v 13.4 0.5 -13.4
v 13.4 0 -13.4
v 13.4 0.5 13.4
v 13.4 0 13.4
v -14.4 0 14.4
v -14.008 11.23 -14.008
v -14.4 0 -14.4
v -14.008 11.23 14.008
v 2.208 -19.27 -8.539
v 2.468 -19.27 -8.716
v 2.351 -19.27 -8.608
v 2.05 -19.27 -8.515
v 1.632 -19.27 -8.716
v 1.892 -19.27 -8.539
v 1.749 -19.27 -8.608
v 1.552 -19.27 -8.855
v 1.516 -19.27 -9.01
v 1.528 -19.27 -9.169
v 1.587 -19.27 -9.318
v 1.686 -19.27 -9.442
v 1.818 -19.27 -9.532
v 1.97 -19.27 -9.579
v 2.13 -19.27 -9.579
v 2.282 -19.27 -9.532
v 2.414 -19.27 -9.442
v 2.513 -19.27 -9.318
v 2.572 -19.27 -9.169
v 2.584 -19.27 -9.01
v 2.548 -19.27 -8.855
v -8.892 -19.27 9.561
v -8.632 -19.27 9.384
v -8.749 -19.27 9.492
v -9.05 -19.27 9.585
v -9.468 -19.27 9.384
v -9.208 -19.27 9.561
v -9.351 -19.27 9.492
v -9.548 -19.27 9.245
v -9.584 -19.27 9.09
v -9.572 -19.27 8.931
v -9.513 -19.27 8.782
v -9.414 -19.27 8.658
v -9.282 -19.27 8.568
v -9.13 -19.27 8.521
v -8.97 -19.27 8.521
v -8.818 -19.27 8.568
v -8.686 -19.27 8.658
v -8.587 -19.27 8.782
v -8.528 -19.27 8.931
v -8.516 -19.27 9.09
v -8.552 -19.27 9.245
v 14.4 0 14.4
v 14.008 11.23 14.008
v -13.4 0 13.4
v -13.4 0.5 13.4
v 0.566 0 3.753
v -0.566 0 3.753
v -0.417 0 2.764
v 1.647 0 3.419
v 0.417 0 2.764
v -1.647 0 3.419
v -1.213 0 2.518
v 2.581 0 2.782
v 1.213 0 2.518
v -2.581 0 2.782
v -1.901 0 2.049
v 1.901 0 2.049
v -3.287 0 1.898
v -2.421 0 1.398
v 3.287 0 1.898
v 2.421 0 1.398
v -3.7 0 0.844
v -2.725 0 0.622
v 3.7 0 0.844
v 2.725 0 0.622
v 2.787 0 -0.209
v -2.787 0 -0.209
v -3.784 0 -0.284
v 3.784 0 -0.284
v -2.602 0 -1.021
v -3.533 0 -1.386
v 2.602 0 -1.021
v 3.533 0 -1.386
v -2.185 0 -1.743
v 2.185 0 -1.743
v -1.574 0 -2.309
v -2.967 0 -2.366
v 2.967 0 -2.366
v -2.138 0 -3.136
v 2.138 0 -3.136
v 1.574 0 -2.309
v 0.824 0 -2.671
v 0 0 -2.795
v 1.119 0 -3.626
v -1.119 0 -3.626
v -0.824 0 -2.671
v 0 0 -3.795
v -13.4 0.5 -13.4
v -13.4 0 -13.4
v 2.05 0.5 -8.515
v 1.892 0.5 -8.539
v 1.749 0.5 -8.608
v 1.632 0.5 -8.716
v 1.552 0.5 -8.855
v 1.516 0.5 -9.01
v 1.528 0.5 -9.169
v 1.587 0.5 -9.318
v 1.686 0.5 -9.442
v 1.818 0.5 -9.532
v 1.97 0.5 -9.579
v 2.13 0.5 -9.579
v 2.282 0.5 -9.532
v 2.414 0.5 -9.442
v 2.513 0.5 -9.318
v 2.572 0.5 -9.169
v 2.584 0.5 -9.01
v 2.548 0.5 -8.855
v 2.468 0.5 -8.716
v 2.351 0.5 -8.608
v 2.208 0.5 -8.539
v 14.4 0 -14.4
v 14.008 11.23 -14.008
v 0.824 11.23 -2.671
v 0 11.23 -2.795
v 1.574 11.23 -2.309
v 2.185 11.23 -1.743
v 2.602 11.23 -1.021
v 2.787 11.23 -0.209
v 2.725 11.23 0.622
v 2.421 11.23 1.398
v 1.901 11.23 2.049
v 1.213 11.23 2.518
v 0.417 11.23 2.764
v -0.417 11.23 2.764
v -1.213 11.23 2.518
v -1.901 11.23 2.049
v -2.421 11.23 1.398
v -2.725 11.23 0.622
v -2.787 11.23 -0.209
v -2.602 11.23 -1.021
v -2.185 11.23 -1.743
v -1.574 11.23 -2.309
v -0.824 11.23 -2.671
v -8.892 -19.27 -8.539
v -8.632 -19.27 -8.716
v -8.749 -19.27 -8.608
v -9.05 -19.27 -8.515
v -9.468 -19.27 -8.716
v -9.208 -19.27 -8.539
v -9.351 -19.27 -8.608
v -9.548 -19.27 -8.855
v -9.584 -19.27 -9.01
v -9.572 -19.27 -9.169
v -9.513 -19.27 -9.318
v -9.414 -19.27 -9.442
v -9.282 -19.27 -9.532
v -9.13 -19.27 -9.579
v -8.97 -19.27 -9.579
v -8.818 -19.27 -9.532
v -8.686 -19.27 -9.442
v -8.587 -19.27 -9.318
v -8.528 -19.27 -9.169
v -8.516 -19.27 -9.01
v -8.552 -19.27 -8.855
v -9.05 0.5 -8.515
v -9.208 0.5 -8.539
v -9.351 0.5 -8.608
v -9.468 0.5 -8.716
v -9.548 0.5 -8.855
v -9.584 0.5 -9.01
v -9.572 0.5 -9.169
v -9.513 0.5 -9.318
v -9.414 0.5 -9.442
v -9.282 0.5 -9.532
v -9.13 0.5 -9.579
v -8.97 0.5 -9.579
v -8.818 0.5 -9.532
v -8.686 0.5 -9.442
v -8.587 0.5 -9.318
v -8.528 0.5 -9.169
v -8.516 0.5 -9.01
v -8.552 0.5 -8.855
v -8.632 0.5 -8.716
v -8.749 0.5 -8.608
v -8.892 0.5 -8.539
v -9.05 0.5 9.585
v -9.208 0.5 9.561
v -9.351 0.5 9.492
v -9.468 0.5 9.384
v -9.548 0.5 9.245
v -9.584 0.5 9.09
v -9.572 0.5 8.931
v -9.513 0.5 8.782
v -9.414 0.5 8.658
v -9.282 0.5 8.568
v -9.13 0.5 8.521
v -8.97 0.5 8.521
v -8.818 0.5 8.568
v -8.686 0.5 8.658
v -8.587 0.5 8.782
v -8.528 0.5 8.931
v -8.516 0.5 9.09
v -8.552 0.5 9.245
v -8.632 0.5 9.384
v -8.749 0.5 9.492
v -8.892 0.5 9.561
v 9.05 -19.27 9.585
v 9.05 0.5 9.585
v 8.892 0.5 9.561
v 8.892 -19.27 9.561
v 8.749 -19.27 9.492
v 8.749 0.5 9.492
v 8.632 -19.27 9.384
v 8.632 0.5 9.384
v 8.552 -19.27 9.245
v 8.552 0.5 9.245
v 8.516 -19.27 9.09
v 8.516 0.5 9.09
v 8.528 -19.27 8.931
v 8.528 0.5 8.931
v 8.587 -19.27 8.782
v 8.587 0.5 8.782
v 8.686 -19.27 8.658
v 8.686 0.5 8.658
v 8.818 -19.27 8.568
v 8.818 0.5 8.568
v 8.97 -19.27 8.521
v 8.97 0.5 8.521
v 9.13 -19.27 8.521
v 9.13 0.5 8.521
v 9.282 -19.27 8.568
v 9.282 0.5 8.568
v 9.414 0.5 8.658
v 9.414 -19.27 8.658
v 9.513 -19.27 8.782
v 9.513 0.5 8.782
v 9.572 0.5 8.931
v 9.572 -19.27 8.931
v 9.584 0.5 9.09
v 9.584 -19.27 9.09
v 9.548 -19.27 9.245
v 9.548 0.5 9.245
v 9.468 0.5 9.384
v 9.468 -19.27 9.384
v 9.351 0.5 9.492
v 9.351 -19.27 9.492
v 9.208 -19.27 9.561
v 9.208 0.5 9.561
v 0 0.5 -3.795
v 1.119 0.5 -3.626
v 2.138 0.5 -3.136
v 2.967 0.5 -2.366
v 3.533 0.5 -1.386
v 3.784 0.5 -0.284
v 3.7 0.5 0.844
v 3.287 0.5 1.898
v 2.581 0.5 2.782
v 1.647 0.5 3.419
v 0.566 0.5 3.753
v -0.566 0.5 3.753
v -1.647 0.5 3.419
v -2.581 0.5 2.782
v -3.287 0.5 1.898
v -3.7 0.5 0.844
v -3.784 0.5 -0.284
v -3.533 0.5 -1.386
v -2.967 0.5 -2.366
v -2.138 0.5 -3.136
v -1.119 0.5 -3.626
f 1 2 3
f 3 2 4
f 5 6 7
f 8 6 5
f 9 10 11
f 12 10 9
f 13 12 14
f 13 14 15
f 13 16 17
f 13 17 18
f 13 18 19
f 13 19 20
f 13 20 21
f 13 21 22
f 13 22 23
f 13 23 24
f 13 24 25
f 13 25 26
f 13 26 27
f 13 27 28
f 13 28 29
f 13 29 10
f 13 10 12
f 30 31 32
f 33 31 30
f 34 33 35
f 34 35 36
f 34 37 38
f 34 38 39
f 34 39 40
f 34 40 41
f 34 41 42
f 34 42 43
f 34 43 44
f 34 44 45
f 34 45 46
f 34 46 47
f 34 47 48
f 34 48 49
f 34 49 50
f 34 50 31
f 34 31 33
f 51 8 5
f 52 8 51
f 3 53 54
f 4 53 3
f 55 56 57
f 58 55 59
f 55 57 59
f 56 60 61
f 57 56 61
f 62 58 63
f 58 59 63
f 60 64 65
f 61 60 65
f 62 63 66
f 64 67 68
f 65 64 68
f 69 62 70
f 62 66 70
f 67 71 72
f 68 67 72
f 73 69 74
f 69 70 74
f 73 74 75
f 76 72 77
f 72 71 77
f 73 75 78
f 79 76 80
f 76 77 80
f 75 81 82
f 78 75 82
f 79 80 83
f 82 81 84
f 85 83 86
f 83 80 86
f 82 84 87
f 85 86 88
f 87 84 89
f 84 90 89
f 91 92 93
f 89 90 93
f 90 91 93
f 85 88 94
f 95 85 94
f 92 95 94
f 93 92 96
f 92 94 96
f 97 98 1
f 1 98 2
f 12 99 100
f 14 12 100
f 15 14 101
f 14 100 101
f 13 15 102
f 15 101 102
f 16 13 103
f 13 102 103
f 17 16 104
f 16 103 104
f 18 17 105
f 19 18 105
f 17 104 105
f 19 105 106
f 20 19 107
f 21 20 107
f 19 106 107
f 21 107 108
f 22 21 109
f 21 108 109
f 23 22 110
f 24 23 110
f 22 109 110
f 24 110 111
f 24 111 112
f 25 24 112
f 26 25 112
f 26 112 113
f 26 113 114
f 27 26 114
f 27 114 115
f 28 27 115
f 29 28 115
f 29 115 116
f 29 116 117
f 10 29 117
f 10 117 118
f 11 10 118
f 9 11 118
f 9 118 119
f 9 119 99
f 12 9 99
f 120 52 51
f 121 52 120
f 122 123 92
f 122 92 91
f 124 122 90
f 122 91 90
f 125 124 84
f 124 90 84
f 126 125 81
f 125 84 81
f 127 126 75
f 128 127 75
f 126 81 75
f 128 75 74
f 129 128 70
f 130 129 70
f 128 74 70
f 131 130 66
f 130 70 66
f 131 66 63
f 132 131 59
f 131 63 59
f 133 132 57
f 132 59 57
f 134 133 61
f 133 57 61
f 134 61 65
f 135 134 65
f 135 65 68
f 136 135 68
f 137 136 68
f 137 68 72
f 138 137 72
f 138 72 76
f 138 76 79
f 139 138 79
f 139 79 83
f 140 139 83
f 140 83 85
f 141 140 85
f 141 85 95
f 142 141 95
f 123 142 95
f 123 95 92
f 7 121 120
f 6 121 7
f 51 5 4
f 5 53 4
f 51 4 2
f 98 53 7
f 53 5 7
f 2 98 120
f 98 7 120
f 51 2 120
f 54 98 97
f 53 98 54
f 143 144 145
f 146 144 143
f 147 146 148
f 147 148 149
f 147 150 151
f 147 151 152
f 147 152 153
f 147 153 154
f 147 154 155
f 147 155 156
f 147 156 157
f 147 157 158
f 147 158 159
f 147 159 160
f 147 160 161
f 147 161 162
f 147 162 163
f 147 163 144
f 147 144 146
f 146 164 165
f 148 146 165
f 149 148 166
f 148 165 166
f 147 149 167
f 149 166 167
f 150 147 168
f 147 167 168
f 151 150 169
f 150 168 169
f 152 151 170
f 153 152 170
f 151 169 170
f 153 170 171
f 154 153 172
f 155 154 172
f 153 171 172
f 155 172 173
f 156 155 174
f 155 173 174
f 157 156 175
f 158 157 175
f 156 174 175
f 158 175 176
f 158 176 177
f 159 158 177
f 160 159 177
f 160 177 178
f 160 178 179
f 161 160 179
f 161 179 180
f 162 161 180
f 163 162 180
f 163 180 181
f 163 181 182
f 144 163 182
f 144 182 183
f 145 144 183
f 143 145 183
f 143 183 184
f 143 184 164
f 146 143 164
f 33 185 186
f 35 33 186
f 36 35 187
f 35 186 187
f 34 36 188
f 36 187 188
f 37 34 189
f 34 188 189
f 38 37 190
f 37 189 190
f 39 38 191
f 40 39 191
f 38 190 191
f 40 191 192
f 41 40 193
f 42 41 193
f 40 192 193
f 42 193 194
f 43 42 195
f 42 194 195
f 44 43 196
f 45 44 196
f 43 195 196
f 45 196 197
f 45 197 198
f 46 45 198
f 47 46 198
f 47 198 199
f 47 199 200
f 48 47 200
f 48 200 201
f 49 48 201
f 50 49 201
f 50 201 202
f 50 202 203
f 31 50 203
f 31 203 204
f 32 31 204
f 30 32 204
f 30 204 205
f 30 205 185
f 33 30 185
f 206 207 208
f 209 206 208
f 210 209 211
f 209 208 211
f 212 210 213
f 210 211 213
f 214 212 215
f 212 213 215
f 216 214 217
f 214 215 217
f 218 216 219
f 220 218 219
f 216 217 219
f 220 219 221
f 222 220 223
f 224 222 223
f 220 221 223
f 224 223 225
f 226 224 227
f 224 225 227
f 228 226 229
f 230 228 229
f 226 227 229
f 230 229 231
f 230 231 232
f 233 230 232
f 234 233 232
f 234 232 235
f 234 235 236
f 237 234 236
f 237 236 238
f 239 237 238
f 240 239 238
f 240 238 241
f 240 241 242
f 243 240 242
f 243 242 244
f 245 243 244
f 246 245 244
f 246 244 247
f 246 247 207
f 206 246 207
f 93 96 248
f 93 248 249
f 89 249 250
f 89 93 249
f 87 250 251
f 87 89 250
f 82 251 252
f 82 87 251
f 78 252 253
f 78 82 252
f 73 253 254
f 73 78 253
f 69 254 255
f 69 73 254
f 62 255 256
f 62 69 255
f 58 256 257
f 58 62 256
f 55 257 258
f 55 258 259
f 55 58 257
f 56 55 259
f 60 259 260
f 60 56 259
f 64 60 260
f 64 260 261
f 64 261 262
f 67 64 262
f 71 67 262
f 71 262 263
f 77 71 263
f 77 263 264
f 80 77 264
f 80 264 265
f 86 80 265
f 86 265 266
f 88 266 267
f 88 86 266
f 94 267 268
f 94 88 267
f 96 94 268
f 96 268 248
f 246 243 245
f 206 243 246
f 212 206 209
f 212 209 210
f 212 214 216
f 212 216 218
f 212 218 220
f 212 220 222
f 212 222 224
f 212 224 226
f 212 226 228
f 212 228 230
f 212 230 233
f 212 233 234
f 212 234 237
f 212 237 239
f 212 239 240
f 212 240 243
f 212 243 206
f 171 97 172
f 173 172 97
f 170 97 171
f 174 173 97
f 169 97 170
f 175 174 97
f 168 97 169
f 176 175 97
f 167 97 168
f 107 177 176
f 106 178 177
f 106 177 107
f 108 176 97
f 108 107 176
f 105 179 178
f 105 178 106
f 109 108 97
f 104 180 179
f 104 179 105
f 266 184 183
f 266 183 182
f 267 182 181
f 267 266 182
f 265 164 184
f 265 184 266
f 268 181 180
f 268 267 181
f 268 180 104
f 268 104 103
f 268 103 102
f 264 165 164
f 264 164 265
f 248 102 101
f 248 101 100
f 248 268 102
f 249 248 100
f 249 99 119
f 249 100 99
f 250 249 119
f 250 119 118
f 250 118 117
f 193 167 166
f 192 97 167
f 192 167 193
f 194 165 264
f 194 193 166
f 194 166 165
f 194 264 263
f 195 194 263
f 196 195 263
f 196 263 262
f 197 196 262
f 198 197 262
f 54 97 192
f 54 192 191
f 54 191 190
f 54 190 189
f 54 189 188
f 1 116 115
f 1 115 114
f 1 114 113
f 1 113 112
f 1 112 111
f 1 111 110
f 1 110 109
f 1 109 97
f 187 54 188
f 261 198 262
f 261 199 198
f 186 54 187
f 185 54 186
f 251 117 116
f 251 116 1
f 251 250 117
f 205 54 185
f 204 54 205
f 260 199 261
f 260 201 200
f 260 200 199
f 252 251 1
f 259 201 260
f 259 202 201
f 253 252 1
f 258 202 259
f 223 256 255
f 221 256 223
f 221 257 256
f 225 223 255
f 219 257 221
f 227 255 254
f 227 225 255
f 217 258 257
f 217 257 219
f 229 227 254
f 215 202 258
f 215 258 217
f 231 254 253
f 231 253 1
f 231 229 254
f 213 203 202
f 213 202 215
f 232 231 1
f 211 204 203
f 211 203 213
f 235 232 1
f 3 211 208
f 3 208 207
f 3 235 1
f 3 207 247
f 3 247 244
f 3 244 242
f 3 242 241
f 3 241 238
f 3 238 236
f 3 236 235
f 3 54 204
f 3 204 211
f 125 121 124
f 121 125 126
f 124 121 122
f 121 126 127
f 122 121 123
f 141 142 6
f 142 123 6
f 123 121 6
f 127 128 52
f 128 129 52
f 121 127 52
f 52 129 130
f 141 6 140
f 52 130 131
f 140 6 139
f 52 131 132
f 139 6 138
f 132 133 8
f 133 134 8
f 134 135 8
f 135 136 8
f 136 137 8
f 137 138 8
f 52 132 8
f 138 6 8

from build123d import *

# Parameters (mm, degrees)
SKETCH1_W           = 28.8
SKETCH1_H           = 28.8
BOSS_EXTRUDE1_DEPTH = 11.23
BOSS_EXTRUDE1_TAPER = 2
SKETCH2_W           = 26.8
SKETCH2_H           = 26.8
SKETCH2_R           = 3.795
CUT_EXTRUDE1_DEPTH  = 0.5
SKETCH3_R           = 2.795
CUT_EXTRUDE2_DEPTH  = 24.255814499
BOSS_EXTRUDE2_START = -10.73
SKETCH4_R           = 0.535
BOSS_EXTRUDE2_DEPTH = 30.5


with BuildPart() as part:
    # Sketch1 → Boss-Extrude1 (new body)
    with BuildSketch(Plane(origin=(0, 0, 0), x_dir=(1, 0, 0), z_dir=(0, 1, 0))):
        Rectangle(SKETCH1_W, SKETCH1_H)
    extrude(amount=BOSS_EXTRUDE1_DEPTH, taper=BOSS_EXTRUDE1_TAPER)

    # Sketch2 → Cut-Extrude1 (cut)
    with BuildSketch(Plane.XZ):
        Rectangle(SKETCH2_W, SKETCH2_H)
        with Locations(Location((0, 0, 0), (0, 0, 270))):
            Circle(SKETCH2_R, mode=Mode.SUBTRACT)
    extrude(amount=-CUT_EXTRUDE1_DEPTH, mode=Mode.SUBTRACT)

    # Sketch3 → Cut-Extrude2 (cut, through all)
    with BuildSketch(Plane.XZ):
        with Locations(Location((0, 0, 0), (0, 0, 270))):
            Circle(SKETCH3_R)
    extrude(amount=-CUT_EXTRUDE2_DEPTH, mode=Mode.SUBTRACT)

    # Sketch4 → Boss-Extrude2 (add)
    with BuildSketch(Plane.XZ.offset(-0.5).offset(BOSS_EXTRUDE2_START)):
        with Locations(Location((-9.05, 9.05, 0), (0, 0, 90))):
            Circle(SKETCH4_R)
        with Locations(Location((9.05, 9.05, 0), (0, 0, 90))):
            Circle(SKETCH4_R)
        with Locations(Location((-9.05, -9.05, 0), (0, 0, 90))):
            Circle(SKETCH4_R)
        with Locations(Location((2.05, -9.05, 0), (0, 0, 90))):
            Circle(SKETCH4_R)
    extrude(amount=BOSS_EXTRUDE2_DEPTH)


solid = part.part
